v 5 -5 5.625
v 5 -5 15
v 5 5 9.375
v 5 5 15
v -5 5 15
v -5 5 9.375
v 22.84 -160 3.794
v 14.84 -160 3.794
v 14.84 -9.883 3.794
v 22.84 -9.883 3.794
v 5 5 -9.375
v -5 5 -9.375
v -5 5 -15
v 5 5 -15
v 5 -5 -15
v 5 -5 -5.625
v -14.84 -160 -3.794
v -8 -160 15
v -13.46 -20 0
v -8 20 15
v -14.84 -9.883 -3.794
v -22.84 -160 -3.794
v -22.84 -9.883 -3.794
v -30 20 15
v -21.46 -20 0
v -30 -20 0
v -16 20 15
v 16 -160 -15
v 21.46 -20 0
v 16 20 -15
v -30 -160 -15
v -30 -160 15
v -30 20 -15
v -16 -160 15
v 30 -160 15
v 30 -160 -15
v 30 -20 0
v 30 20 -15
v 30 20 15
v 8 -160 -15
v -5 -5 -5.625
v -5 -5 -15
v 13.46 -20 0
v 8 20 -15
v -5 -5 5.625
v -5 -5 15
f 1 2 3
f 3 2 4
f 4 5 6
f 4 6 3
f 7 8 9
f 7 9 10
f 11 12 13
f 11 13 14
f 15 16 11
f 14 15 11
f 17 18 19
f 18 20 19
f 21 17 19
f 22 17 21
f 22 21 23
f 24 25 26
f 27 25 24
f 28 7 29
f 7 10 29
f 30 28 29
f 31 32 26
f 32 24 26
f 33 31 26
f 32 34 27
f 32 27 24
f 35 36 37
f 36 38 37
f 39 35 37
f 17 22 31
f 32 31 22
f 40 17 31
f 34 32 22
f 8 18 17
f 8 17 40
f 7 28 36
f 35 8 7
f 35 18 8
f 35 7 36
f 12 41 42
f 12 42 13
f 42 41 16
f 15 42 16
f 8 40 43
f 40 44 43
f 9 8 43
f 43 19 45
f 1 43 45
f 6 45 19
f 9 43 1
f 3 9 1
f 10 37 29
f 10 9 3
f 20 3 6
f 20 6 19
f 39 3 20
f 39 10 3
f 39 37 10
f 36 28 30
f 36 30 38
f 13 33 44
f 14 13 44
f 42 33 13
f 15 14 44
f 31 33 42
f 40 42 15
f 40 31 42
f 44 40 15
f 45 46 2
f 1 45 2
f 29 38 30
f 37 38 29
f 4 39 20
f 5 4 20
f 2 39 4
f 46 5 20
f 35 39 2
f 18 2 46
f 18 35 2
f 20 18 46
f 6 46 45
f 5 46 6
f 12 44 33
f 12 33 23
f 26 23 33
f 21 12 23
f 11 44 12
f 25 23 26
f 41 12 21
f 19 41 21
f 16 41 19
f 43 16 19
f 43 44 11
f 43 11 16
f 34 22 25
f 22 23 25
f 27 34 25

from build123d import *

# Parameters (mm, degrees)
F1_DEPTH = 160
F2_W     = 10
F2_H     = 10
F3_DEPTH = 60
F5_DEPTH = 60


with BuildPart() as f1:
    # F0 (on Front) → F1 (new body, symmetric)
    with BuildSketch(Plane.XZ):
        Polygon((30, -15), (30, 15), (-8, 15), (-14.8404028665, -3.7938524157), (-22.8404028665, -3.7938524157), (-16, 15), (-30, 15), (-30, -15), (8, -15), (14.8404028665, 3.7938524157), (22.8404028665, 3.7938524157), (16, -15), align=None)
    extrude(amount=F1_DEPTH, both=True)

    # F2 (on face) → F3 (cut)
    with BuildSketch(Plane.XY.offset(15)):
        Rectangle(F2_W, F2_H)
    extrude(amount=-F3_DEPTH, mode=Mode.SUBTRACT)

    # F4 (on face) → F5 (intersect)
    with BuildSketch(Plane.YZ.offset(30)):
        Polygon((0, 7.5), (0, 15), (-160, 15), (-160, -15), (0, -15), (0, -7.5), (-20, 0), align=None)
        Polygon((20, 15), (0, 15), (0, 7.5), align=None)
        Polygon((0, -15), (20, -15), (0, -7.5), align=None)
    extrude(amount=-F5_DEPTH, mode=Mode.INTERSECT)


solid = f1.part
